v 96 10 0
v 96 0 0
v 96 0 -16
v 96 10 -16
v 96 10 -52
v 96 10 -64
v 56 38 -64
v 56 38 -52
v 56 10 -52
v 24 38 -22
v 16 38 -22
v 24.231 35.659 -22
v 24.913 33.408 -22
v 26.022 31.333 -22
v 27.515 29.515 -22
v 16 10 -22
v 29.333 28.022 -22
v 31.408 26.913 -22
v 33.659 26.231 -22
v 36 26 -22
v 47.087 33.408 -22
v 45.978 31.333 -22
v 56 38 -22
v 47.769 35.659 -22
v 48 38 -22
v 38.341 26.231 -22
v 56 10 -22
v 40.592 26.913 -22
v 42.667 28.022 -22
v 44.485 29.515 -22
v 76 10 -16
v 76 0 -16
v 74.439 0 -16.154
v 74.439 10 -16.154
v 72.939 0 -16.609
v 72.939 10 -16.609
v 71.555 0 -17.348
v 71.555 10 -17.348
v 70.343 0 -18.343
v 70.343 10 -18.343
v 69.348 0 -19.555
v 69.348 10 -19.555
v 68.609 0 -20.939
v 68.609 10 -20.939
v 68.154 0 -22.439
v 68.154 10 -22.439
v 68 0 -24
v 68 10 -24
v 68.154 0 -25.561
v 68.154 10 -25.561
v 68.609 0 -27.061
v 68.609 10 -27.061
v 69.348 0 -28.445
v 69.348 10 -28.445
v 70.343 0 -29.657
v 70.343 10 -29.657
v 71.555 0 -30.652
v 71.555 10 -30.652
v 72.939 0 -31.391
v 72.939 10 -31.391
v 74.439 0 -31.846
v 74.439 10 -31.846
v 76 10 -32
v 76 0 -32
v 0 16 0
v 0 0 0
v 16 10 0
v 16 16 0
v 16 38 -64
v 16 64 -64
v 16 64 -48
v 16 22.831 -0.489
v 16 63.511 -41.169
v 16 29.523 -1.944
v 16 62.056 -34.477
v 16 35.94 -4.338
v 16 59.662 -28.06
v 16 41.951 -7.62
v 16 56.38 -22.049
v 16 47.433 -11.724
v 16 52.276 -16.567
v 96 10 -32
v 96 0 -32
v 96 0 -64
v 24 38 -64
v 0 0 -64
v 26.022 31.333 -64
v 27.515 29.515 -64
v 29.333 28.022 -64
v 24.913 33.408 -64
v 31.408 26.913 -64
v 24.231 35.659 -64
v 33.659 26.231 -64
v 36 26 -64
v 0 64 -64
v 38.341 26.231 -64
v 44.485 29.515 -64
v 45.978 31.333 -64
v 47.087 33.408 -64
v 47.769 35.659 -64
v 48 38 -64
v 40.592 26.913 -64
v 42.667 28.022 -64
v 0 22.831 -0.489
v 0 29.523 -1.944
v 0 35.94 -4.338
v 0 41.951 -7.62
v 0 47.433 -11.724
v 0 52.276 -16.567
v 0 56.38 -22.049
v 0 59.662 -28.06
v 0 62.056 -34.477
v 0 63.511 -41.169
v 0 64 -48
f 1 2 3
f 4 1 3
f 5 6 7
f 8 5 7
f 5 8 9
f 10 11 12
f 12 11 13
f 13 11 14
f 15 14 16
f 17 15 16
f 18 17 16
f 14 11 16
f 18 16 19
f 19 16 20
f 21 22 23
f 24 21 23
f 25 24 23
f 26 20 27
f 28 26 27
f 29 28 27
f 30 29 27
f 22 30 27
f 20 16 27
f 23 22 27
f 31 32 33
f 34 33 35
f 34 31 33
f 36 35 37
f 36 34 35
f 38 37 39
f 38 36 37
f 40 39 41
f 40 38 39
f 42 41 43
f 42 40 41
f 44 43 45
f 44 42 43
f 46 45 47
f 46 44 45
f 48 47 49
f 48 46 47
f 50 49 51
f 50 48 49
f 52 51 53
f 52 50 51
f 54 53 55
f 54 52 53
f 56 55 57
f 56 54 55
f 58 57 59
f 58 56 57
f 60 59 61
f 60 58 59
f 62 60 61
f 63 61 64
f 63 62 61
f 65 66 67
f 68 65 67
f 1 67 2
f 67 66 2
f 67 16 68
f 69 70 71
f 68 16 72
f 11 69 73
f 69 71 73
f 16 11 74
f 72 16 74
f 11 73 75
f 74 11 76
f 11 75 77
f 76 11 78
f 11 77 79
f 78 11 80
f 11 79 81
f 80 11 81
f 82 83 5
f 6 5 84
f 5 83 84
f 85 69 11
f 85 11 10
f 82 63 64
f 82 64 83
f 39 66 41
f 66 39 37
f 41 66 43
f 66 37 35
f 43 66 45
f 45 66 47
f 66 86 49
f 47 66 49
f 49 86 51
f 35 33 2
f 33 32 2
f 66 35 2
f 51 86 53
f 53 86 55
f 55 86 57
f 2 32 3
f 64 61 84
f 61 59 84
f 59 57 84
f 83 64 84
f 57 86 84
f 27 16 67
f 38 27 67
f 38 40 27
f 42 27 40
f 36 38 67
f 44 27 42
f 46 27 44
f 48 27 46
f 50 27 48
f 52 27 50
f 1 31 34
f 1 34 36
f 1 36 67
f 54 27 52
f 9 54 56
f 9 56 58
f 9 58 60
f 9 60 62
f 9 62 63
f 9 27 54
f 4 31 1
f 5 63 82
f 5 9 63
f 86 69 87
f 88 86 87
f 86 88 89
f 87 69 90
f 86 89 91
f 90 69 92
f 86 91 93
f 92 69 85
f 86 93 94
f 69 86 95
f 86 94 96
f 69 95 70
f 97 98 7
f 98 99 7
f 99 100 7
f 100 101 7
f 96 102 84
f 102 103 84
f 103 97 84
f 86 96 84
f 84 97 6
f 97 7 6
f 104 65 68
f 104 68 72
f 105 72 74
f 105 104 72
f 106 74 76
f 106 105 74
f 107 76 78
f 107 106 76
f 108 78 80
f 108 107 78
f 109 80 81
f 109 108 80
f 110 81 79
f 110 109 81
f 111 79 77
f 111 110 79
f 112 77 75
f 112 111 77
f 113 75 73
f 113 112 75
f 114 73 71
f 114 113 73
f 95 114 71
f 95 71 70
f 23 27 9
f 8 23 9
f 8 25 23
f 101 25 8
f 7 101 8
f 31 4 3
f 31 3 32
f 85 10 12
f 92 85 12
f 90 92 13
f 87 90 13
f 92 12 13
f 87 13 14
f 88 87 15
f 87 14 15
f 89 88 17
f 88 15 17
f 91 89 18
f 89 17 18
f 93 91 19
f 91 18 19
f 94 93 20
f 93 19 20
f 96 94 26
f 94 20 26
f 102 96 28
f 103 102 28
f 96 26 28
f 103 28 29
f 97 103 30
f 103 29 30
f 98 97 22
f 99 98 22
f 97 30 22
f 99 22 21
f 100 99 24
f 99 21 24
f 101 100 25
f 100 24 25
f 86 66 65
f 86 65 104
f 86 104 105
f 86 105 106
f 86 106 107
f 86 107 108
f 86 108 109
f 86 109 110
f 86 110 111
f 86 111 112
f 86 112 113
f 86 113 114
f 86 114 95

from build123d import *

# Parameters (mm, degrees)
SKETCH2_W           = 96
SKETCH2_H           = 64
BOSS_EXTRUDE1_DEPTH = 10
CUT_EXTRUDE3_DEPTH  = 13
BOSS_EXTRUDE4_DEPTH = 16
SKETCH8_W           = 40
SKETCH8_H           = 42
BOSS_EXTRUDE6_DEPTH = 28
CUT_EXTRUDE4_REACH  = 124.784
SKETCH9_R           = 12
BOSS_EXTRUDE7_DEPTH = 12


with BuildPart() as part:
    # Sketch2 → Boss-Extrude1 (new body)
    with BuildSketch(Plane(origin=(0, 0, 0), x_dir=(1, 0, 0), z_dir=(0, 1, 0))):
        with Locations((48, 32)):
            Rectangle(SKETCH2_W, SKETCH2_H)
    extrude(amount=BOSS_EXTRUDE1_DEPTH)

    # Sketch3 → Cut-Extrude3 (cut)
    with BuildSketch(Plane(origin=(0, 10, 0), x_dir=(1, 0, 0), z_dir=(0, 1, 0))):
        with BuildLine():
            Line((96, 16), (76, 16))
            ThreePointArc((76, 16), (68, 24), (76, 32))
            Line((76, 32), (96, 32))
            ThreePointArc((96, 32), (104, 24), (96, 16))
        make_face()
    extrude(amount=-CUT_EXTRUDE3_DEPTH, mode=Mode.SUBTRACT)

    # Sketch7 → Boss-Extrude4 (add)
    with BuildSketch(Plane.ZY):
        with BuildLine():
            Line((-64, 0), (0, 0))
            Line((0, 0), (0, 16))
            ThreePointArc((0, 16), (-14.058874503, 49.941125497), (-48, 64))
            Line((-48, 64), (-64, 64))
            Line((-64, 64), (-64, 0))
        make_face()
    extrude(amount=-BOSS_EXTRUDE4_DEPTH)

    # Sketch8 → Boss-Extrude6 (add)
    with BuildSketch(Plane(origin=(0, 10, 0), x_dir=(1, 0, 0), z_dir=(0, 1, 0))):
        with Locations((36, 43)):
            Rectangle(SKETCH8_W, SKETCH8_H)
    extrude(amount=BOSS_EXTRUDE6_DEPTH)

    # Sketch9 → Cut-Extrude4 (cut, up to next)
    with BuildSketch(Plane.XY.offset(-22), mode=Mode.PRIVATE) as cut_extrude4_sk1:
        with Locations((36, 38)):
            Circle(SKETCH9_R)
    cut_extrude4_tool1 = extrude(cut_extrude4_sk1.sketch, amount=-CUT_EXTRUDE4_REACH, mode=Mode.PRIVATE) & part.part
    add(cut_extrude4_tool1.solids().sort_by_distance((36, 38, -22))[0], mode=Mode.SUBTRACT)

    # Sketch15 → Boss-Extrude7 (add)
    with BuildSketch(Plane(origin=(0, 0, -64), x_dir=(-1, 0, 0), z_dir=(0, 0, -1))):
        Polygon((-96, 10), (-56, 38), (-56, 10), align=None)
    extrude(amount=-BOSS_EXTRUDE7_DEPTH)


solid = part.part
